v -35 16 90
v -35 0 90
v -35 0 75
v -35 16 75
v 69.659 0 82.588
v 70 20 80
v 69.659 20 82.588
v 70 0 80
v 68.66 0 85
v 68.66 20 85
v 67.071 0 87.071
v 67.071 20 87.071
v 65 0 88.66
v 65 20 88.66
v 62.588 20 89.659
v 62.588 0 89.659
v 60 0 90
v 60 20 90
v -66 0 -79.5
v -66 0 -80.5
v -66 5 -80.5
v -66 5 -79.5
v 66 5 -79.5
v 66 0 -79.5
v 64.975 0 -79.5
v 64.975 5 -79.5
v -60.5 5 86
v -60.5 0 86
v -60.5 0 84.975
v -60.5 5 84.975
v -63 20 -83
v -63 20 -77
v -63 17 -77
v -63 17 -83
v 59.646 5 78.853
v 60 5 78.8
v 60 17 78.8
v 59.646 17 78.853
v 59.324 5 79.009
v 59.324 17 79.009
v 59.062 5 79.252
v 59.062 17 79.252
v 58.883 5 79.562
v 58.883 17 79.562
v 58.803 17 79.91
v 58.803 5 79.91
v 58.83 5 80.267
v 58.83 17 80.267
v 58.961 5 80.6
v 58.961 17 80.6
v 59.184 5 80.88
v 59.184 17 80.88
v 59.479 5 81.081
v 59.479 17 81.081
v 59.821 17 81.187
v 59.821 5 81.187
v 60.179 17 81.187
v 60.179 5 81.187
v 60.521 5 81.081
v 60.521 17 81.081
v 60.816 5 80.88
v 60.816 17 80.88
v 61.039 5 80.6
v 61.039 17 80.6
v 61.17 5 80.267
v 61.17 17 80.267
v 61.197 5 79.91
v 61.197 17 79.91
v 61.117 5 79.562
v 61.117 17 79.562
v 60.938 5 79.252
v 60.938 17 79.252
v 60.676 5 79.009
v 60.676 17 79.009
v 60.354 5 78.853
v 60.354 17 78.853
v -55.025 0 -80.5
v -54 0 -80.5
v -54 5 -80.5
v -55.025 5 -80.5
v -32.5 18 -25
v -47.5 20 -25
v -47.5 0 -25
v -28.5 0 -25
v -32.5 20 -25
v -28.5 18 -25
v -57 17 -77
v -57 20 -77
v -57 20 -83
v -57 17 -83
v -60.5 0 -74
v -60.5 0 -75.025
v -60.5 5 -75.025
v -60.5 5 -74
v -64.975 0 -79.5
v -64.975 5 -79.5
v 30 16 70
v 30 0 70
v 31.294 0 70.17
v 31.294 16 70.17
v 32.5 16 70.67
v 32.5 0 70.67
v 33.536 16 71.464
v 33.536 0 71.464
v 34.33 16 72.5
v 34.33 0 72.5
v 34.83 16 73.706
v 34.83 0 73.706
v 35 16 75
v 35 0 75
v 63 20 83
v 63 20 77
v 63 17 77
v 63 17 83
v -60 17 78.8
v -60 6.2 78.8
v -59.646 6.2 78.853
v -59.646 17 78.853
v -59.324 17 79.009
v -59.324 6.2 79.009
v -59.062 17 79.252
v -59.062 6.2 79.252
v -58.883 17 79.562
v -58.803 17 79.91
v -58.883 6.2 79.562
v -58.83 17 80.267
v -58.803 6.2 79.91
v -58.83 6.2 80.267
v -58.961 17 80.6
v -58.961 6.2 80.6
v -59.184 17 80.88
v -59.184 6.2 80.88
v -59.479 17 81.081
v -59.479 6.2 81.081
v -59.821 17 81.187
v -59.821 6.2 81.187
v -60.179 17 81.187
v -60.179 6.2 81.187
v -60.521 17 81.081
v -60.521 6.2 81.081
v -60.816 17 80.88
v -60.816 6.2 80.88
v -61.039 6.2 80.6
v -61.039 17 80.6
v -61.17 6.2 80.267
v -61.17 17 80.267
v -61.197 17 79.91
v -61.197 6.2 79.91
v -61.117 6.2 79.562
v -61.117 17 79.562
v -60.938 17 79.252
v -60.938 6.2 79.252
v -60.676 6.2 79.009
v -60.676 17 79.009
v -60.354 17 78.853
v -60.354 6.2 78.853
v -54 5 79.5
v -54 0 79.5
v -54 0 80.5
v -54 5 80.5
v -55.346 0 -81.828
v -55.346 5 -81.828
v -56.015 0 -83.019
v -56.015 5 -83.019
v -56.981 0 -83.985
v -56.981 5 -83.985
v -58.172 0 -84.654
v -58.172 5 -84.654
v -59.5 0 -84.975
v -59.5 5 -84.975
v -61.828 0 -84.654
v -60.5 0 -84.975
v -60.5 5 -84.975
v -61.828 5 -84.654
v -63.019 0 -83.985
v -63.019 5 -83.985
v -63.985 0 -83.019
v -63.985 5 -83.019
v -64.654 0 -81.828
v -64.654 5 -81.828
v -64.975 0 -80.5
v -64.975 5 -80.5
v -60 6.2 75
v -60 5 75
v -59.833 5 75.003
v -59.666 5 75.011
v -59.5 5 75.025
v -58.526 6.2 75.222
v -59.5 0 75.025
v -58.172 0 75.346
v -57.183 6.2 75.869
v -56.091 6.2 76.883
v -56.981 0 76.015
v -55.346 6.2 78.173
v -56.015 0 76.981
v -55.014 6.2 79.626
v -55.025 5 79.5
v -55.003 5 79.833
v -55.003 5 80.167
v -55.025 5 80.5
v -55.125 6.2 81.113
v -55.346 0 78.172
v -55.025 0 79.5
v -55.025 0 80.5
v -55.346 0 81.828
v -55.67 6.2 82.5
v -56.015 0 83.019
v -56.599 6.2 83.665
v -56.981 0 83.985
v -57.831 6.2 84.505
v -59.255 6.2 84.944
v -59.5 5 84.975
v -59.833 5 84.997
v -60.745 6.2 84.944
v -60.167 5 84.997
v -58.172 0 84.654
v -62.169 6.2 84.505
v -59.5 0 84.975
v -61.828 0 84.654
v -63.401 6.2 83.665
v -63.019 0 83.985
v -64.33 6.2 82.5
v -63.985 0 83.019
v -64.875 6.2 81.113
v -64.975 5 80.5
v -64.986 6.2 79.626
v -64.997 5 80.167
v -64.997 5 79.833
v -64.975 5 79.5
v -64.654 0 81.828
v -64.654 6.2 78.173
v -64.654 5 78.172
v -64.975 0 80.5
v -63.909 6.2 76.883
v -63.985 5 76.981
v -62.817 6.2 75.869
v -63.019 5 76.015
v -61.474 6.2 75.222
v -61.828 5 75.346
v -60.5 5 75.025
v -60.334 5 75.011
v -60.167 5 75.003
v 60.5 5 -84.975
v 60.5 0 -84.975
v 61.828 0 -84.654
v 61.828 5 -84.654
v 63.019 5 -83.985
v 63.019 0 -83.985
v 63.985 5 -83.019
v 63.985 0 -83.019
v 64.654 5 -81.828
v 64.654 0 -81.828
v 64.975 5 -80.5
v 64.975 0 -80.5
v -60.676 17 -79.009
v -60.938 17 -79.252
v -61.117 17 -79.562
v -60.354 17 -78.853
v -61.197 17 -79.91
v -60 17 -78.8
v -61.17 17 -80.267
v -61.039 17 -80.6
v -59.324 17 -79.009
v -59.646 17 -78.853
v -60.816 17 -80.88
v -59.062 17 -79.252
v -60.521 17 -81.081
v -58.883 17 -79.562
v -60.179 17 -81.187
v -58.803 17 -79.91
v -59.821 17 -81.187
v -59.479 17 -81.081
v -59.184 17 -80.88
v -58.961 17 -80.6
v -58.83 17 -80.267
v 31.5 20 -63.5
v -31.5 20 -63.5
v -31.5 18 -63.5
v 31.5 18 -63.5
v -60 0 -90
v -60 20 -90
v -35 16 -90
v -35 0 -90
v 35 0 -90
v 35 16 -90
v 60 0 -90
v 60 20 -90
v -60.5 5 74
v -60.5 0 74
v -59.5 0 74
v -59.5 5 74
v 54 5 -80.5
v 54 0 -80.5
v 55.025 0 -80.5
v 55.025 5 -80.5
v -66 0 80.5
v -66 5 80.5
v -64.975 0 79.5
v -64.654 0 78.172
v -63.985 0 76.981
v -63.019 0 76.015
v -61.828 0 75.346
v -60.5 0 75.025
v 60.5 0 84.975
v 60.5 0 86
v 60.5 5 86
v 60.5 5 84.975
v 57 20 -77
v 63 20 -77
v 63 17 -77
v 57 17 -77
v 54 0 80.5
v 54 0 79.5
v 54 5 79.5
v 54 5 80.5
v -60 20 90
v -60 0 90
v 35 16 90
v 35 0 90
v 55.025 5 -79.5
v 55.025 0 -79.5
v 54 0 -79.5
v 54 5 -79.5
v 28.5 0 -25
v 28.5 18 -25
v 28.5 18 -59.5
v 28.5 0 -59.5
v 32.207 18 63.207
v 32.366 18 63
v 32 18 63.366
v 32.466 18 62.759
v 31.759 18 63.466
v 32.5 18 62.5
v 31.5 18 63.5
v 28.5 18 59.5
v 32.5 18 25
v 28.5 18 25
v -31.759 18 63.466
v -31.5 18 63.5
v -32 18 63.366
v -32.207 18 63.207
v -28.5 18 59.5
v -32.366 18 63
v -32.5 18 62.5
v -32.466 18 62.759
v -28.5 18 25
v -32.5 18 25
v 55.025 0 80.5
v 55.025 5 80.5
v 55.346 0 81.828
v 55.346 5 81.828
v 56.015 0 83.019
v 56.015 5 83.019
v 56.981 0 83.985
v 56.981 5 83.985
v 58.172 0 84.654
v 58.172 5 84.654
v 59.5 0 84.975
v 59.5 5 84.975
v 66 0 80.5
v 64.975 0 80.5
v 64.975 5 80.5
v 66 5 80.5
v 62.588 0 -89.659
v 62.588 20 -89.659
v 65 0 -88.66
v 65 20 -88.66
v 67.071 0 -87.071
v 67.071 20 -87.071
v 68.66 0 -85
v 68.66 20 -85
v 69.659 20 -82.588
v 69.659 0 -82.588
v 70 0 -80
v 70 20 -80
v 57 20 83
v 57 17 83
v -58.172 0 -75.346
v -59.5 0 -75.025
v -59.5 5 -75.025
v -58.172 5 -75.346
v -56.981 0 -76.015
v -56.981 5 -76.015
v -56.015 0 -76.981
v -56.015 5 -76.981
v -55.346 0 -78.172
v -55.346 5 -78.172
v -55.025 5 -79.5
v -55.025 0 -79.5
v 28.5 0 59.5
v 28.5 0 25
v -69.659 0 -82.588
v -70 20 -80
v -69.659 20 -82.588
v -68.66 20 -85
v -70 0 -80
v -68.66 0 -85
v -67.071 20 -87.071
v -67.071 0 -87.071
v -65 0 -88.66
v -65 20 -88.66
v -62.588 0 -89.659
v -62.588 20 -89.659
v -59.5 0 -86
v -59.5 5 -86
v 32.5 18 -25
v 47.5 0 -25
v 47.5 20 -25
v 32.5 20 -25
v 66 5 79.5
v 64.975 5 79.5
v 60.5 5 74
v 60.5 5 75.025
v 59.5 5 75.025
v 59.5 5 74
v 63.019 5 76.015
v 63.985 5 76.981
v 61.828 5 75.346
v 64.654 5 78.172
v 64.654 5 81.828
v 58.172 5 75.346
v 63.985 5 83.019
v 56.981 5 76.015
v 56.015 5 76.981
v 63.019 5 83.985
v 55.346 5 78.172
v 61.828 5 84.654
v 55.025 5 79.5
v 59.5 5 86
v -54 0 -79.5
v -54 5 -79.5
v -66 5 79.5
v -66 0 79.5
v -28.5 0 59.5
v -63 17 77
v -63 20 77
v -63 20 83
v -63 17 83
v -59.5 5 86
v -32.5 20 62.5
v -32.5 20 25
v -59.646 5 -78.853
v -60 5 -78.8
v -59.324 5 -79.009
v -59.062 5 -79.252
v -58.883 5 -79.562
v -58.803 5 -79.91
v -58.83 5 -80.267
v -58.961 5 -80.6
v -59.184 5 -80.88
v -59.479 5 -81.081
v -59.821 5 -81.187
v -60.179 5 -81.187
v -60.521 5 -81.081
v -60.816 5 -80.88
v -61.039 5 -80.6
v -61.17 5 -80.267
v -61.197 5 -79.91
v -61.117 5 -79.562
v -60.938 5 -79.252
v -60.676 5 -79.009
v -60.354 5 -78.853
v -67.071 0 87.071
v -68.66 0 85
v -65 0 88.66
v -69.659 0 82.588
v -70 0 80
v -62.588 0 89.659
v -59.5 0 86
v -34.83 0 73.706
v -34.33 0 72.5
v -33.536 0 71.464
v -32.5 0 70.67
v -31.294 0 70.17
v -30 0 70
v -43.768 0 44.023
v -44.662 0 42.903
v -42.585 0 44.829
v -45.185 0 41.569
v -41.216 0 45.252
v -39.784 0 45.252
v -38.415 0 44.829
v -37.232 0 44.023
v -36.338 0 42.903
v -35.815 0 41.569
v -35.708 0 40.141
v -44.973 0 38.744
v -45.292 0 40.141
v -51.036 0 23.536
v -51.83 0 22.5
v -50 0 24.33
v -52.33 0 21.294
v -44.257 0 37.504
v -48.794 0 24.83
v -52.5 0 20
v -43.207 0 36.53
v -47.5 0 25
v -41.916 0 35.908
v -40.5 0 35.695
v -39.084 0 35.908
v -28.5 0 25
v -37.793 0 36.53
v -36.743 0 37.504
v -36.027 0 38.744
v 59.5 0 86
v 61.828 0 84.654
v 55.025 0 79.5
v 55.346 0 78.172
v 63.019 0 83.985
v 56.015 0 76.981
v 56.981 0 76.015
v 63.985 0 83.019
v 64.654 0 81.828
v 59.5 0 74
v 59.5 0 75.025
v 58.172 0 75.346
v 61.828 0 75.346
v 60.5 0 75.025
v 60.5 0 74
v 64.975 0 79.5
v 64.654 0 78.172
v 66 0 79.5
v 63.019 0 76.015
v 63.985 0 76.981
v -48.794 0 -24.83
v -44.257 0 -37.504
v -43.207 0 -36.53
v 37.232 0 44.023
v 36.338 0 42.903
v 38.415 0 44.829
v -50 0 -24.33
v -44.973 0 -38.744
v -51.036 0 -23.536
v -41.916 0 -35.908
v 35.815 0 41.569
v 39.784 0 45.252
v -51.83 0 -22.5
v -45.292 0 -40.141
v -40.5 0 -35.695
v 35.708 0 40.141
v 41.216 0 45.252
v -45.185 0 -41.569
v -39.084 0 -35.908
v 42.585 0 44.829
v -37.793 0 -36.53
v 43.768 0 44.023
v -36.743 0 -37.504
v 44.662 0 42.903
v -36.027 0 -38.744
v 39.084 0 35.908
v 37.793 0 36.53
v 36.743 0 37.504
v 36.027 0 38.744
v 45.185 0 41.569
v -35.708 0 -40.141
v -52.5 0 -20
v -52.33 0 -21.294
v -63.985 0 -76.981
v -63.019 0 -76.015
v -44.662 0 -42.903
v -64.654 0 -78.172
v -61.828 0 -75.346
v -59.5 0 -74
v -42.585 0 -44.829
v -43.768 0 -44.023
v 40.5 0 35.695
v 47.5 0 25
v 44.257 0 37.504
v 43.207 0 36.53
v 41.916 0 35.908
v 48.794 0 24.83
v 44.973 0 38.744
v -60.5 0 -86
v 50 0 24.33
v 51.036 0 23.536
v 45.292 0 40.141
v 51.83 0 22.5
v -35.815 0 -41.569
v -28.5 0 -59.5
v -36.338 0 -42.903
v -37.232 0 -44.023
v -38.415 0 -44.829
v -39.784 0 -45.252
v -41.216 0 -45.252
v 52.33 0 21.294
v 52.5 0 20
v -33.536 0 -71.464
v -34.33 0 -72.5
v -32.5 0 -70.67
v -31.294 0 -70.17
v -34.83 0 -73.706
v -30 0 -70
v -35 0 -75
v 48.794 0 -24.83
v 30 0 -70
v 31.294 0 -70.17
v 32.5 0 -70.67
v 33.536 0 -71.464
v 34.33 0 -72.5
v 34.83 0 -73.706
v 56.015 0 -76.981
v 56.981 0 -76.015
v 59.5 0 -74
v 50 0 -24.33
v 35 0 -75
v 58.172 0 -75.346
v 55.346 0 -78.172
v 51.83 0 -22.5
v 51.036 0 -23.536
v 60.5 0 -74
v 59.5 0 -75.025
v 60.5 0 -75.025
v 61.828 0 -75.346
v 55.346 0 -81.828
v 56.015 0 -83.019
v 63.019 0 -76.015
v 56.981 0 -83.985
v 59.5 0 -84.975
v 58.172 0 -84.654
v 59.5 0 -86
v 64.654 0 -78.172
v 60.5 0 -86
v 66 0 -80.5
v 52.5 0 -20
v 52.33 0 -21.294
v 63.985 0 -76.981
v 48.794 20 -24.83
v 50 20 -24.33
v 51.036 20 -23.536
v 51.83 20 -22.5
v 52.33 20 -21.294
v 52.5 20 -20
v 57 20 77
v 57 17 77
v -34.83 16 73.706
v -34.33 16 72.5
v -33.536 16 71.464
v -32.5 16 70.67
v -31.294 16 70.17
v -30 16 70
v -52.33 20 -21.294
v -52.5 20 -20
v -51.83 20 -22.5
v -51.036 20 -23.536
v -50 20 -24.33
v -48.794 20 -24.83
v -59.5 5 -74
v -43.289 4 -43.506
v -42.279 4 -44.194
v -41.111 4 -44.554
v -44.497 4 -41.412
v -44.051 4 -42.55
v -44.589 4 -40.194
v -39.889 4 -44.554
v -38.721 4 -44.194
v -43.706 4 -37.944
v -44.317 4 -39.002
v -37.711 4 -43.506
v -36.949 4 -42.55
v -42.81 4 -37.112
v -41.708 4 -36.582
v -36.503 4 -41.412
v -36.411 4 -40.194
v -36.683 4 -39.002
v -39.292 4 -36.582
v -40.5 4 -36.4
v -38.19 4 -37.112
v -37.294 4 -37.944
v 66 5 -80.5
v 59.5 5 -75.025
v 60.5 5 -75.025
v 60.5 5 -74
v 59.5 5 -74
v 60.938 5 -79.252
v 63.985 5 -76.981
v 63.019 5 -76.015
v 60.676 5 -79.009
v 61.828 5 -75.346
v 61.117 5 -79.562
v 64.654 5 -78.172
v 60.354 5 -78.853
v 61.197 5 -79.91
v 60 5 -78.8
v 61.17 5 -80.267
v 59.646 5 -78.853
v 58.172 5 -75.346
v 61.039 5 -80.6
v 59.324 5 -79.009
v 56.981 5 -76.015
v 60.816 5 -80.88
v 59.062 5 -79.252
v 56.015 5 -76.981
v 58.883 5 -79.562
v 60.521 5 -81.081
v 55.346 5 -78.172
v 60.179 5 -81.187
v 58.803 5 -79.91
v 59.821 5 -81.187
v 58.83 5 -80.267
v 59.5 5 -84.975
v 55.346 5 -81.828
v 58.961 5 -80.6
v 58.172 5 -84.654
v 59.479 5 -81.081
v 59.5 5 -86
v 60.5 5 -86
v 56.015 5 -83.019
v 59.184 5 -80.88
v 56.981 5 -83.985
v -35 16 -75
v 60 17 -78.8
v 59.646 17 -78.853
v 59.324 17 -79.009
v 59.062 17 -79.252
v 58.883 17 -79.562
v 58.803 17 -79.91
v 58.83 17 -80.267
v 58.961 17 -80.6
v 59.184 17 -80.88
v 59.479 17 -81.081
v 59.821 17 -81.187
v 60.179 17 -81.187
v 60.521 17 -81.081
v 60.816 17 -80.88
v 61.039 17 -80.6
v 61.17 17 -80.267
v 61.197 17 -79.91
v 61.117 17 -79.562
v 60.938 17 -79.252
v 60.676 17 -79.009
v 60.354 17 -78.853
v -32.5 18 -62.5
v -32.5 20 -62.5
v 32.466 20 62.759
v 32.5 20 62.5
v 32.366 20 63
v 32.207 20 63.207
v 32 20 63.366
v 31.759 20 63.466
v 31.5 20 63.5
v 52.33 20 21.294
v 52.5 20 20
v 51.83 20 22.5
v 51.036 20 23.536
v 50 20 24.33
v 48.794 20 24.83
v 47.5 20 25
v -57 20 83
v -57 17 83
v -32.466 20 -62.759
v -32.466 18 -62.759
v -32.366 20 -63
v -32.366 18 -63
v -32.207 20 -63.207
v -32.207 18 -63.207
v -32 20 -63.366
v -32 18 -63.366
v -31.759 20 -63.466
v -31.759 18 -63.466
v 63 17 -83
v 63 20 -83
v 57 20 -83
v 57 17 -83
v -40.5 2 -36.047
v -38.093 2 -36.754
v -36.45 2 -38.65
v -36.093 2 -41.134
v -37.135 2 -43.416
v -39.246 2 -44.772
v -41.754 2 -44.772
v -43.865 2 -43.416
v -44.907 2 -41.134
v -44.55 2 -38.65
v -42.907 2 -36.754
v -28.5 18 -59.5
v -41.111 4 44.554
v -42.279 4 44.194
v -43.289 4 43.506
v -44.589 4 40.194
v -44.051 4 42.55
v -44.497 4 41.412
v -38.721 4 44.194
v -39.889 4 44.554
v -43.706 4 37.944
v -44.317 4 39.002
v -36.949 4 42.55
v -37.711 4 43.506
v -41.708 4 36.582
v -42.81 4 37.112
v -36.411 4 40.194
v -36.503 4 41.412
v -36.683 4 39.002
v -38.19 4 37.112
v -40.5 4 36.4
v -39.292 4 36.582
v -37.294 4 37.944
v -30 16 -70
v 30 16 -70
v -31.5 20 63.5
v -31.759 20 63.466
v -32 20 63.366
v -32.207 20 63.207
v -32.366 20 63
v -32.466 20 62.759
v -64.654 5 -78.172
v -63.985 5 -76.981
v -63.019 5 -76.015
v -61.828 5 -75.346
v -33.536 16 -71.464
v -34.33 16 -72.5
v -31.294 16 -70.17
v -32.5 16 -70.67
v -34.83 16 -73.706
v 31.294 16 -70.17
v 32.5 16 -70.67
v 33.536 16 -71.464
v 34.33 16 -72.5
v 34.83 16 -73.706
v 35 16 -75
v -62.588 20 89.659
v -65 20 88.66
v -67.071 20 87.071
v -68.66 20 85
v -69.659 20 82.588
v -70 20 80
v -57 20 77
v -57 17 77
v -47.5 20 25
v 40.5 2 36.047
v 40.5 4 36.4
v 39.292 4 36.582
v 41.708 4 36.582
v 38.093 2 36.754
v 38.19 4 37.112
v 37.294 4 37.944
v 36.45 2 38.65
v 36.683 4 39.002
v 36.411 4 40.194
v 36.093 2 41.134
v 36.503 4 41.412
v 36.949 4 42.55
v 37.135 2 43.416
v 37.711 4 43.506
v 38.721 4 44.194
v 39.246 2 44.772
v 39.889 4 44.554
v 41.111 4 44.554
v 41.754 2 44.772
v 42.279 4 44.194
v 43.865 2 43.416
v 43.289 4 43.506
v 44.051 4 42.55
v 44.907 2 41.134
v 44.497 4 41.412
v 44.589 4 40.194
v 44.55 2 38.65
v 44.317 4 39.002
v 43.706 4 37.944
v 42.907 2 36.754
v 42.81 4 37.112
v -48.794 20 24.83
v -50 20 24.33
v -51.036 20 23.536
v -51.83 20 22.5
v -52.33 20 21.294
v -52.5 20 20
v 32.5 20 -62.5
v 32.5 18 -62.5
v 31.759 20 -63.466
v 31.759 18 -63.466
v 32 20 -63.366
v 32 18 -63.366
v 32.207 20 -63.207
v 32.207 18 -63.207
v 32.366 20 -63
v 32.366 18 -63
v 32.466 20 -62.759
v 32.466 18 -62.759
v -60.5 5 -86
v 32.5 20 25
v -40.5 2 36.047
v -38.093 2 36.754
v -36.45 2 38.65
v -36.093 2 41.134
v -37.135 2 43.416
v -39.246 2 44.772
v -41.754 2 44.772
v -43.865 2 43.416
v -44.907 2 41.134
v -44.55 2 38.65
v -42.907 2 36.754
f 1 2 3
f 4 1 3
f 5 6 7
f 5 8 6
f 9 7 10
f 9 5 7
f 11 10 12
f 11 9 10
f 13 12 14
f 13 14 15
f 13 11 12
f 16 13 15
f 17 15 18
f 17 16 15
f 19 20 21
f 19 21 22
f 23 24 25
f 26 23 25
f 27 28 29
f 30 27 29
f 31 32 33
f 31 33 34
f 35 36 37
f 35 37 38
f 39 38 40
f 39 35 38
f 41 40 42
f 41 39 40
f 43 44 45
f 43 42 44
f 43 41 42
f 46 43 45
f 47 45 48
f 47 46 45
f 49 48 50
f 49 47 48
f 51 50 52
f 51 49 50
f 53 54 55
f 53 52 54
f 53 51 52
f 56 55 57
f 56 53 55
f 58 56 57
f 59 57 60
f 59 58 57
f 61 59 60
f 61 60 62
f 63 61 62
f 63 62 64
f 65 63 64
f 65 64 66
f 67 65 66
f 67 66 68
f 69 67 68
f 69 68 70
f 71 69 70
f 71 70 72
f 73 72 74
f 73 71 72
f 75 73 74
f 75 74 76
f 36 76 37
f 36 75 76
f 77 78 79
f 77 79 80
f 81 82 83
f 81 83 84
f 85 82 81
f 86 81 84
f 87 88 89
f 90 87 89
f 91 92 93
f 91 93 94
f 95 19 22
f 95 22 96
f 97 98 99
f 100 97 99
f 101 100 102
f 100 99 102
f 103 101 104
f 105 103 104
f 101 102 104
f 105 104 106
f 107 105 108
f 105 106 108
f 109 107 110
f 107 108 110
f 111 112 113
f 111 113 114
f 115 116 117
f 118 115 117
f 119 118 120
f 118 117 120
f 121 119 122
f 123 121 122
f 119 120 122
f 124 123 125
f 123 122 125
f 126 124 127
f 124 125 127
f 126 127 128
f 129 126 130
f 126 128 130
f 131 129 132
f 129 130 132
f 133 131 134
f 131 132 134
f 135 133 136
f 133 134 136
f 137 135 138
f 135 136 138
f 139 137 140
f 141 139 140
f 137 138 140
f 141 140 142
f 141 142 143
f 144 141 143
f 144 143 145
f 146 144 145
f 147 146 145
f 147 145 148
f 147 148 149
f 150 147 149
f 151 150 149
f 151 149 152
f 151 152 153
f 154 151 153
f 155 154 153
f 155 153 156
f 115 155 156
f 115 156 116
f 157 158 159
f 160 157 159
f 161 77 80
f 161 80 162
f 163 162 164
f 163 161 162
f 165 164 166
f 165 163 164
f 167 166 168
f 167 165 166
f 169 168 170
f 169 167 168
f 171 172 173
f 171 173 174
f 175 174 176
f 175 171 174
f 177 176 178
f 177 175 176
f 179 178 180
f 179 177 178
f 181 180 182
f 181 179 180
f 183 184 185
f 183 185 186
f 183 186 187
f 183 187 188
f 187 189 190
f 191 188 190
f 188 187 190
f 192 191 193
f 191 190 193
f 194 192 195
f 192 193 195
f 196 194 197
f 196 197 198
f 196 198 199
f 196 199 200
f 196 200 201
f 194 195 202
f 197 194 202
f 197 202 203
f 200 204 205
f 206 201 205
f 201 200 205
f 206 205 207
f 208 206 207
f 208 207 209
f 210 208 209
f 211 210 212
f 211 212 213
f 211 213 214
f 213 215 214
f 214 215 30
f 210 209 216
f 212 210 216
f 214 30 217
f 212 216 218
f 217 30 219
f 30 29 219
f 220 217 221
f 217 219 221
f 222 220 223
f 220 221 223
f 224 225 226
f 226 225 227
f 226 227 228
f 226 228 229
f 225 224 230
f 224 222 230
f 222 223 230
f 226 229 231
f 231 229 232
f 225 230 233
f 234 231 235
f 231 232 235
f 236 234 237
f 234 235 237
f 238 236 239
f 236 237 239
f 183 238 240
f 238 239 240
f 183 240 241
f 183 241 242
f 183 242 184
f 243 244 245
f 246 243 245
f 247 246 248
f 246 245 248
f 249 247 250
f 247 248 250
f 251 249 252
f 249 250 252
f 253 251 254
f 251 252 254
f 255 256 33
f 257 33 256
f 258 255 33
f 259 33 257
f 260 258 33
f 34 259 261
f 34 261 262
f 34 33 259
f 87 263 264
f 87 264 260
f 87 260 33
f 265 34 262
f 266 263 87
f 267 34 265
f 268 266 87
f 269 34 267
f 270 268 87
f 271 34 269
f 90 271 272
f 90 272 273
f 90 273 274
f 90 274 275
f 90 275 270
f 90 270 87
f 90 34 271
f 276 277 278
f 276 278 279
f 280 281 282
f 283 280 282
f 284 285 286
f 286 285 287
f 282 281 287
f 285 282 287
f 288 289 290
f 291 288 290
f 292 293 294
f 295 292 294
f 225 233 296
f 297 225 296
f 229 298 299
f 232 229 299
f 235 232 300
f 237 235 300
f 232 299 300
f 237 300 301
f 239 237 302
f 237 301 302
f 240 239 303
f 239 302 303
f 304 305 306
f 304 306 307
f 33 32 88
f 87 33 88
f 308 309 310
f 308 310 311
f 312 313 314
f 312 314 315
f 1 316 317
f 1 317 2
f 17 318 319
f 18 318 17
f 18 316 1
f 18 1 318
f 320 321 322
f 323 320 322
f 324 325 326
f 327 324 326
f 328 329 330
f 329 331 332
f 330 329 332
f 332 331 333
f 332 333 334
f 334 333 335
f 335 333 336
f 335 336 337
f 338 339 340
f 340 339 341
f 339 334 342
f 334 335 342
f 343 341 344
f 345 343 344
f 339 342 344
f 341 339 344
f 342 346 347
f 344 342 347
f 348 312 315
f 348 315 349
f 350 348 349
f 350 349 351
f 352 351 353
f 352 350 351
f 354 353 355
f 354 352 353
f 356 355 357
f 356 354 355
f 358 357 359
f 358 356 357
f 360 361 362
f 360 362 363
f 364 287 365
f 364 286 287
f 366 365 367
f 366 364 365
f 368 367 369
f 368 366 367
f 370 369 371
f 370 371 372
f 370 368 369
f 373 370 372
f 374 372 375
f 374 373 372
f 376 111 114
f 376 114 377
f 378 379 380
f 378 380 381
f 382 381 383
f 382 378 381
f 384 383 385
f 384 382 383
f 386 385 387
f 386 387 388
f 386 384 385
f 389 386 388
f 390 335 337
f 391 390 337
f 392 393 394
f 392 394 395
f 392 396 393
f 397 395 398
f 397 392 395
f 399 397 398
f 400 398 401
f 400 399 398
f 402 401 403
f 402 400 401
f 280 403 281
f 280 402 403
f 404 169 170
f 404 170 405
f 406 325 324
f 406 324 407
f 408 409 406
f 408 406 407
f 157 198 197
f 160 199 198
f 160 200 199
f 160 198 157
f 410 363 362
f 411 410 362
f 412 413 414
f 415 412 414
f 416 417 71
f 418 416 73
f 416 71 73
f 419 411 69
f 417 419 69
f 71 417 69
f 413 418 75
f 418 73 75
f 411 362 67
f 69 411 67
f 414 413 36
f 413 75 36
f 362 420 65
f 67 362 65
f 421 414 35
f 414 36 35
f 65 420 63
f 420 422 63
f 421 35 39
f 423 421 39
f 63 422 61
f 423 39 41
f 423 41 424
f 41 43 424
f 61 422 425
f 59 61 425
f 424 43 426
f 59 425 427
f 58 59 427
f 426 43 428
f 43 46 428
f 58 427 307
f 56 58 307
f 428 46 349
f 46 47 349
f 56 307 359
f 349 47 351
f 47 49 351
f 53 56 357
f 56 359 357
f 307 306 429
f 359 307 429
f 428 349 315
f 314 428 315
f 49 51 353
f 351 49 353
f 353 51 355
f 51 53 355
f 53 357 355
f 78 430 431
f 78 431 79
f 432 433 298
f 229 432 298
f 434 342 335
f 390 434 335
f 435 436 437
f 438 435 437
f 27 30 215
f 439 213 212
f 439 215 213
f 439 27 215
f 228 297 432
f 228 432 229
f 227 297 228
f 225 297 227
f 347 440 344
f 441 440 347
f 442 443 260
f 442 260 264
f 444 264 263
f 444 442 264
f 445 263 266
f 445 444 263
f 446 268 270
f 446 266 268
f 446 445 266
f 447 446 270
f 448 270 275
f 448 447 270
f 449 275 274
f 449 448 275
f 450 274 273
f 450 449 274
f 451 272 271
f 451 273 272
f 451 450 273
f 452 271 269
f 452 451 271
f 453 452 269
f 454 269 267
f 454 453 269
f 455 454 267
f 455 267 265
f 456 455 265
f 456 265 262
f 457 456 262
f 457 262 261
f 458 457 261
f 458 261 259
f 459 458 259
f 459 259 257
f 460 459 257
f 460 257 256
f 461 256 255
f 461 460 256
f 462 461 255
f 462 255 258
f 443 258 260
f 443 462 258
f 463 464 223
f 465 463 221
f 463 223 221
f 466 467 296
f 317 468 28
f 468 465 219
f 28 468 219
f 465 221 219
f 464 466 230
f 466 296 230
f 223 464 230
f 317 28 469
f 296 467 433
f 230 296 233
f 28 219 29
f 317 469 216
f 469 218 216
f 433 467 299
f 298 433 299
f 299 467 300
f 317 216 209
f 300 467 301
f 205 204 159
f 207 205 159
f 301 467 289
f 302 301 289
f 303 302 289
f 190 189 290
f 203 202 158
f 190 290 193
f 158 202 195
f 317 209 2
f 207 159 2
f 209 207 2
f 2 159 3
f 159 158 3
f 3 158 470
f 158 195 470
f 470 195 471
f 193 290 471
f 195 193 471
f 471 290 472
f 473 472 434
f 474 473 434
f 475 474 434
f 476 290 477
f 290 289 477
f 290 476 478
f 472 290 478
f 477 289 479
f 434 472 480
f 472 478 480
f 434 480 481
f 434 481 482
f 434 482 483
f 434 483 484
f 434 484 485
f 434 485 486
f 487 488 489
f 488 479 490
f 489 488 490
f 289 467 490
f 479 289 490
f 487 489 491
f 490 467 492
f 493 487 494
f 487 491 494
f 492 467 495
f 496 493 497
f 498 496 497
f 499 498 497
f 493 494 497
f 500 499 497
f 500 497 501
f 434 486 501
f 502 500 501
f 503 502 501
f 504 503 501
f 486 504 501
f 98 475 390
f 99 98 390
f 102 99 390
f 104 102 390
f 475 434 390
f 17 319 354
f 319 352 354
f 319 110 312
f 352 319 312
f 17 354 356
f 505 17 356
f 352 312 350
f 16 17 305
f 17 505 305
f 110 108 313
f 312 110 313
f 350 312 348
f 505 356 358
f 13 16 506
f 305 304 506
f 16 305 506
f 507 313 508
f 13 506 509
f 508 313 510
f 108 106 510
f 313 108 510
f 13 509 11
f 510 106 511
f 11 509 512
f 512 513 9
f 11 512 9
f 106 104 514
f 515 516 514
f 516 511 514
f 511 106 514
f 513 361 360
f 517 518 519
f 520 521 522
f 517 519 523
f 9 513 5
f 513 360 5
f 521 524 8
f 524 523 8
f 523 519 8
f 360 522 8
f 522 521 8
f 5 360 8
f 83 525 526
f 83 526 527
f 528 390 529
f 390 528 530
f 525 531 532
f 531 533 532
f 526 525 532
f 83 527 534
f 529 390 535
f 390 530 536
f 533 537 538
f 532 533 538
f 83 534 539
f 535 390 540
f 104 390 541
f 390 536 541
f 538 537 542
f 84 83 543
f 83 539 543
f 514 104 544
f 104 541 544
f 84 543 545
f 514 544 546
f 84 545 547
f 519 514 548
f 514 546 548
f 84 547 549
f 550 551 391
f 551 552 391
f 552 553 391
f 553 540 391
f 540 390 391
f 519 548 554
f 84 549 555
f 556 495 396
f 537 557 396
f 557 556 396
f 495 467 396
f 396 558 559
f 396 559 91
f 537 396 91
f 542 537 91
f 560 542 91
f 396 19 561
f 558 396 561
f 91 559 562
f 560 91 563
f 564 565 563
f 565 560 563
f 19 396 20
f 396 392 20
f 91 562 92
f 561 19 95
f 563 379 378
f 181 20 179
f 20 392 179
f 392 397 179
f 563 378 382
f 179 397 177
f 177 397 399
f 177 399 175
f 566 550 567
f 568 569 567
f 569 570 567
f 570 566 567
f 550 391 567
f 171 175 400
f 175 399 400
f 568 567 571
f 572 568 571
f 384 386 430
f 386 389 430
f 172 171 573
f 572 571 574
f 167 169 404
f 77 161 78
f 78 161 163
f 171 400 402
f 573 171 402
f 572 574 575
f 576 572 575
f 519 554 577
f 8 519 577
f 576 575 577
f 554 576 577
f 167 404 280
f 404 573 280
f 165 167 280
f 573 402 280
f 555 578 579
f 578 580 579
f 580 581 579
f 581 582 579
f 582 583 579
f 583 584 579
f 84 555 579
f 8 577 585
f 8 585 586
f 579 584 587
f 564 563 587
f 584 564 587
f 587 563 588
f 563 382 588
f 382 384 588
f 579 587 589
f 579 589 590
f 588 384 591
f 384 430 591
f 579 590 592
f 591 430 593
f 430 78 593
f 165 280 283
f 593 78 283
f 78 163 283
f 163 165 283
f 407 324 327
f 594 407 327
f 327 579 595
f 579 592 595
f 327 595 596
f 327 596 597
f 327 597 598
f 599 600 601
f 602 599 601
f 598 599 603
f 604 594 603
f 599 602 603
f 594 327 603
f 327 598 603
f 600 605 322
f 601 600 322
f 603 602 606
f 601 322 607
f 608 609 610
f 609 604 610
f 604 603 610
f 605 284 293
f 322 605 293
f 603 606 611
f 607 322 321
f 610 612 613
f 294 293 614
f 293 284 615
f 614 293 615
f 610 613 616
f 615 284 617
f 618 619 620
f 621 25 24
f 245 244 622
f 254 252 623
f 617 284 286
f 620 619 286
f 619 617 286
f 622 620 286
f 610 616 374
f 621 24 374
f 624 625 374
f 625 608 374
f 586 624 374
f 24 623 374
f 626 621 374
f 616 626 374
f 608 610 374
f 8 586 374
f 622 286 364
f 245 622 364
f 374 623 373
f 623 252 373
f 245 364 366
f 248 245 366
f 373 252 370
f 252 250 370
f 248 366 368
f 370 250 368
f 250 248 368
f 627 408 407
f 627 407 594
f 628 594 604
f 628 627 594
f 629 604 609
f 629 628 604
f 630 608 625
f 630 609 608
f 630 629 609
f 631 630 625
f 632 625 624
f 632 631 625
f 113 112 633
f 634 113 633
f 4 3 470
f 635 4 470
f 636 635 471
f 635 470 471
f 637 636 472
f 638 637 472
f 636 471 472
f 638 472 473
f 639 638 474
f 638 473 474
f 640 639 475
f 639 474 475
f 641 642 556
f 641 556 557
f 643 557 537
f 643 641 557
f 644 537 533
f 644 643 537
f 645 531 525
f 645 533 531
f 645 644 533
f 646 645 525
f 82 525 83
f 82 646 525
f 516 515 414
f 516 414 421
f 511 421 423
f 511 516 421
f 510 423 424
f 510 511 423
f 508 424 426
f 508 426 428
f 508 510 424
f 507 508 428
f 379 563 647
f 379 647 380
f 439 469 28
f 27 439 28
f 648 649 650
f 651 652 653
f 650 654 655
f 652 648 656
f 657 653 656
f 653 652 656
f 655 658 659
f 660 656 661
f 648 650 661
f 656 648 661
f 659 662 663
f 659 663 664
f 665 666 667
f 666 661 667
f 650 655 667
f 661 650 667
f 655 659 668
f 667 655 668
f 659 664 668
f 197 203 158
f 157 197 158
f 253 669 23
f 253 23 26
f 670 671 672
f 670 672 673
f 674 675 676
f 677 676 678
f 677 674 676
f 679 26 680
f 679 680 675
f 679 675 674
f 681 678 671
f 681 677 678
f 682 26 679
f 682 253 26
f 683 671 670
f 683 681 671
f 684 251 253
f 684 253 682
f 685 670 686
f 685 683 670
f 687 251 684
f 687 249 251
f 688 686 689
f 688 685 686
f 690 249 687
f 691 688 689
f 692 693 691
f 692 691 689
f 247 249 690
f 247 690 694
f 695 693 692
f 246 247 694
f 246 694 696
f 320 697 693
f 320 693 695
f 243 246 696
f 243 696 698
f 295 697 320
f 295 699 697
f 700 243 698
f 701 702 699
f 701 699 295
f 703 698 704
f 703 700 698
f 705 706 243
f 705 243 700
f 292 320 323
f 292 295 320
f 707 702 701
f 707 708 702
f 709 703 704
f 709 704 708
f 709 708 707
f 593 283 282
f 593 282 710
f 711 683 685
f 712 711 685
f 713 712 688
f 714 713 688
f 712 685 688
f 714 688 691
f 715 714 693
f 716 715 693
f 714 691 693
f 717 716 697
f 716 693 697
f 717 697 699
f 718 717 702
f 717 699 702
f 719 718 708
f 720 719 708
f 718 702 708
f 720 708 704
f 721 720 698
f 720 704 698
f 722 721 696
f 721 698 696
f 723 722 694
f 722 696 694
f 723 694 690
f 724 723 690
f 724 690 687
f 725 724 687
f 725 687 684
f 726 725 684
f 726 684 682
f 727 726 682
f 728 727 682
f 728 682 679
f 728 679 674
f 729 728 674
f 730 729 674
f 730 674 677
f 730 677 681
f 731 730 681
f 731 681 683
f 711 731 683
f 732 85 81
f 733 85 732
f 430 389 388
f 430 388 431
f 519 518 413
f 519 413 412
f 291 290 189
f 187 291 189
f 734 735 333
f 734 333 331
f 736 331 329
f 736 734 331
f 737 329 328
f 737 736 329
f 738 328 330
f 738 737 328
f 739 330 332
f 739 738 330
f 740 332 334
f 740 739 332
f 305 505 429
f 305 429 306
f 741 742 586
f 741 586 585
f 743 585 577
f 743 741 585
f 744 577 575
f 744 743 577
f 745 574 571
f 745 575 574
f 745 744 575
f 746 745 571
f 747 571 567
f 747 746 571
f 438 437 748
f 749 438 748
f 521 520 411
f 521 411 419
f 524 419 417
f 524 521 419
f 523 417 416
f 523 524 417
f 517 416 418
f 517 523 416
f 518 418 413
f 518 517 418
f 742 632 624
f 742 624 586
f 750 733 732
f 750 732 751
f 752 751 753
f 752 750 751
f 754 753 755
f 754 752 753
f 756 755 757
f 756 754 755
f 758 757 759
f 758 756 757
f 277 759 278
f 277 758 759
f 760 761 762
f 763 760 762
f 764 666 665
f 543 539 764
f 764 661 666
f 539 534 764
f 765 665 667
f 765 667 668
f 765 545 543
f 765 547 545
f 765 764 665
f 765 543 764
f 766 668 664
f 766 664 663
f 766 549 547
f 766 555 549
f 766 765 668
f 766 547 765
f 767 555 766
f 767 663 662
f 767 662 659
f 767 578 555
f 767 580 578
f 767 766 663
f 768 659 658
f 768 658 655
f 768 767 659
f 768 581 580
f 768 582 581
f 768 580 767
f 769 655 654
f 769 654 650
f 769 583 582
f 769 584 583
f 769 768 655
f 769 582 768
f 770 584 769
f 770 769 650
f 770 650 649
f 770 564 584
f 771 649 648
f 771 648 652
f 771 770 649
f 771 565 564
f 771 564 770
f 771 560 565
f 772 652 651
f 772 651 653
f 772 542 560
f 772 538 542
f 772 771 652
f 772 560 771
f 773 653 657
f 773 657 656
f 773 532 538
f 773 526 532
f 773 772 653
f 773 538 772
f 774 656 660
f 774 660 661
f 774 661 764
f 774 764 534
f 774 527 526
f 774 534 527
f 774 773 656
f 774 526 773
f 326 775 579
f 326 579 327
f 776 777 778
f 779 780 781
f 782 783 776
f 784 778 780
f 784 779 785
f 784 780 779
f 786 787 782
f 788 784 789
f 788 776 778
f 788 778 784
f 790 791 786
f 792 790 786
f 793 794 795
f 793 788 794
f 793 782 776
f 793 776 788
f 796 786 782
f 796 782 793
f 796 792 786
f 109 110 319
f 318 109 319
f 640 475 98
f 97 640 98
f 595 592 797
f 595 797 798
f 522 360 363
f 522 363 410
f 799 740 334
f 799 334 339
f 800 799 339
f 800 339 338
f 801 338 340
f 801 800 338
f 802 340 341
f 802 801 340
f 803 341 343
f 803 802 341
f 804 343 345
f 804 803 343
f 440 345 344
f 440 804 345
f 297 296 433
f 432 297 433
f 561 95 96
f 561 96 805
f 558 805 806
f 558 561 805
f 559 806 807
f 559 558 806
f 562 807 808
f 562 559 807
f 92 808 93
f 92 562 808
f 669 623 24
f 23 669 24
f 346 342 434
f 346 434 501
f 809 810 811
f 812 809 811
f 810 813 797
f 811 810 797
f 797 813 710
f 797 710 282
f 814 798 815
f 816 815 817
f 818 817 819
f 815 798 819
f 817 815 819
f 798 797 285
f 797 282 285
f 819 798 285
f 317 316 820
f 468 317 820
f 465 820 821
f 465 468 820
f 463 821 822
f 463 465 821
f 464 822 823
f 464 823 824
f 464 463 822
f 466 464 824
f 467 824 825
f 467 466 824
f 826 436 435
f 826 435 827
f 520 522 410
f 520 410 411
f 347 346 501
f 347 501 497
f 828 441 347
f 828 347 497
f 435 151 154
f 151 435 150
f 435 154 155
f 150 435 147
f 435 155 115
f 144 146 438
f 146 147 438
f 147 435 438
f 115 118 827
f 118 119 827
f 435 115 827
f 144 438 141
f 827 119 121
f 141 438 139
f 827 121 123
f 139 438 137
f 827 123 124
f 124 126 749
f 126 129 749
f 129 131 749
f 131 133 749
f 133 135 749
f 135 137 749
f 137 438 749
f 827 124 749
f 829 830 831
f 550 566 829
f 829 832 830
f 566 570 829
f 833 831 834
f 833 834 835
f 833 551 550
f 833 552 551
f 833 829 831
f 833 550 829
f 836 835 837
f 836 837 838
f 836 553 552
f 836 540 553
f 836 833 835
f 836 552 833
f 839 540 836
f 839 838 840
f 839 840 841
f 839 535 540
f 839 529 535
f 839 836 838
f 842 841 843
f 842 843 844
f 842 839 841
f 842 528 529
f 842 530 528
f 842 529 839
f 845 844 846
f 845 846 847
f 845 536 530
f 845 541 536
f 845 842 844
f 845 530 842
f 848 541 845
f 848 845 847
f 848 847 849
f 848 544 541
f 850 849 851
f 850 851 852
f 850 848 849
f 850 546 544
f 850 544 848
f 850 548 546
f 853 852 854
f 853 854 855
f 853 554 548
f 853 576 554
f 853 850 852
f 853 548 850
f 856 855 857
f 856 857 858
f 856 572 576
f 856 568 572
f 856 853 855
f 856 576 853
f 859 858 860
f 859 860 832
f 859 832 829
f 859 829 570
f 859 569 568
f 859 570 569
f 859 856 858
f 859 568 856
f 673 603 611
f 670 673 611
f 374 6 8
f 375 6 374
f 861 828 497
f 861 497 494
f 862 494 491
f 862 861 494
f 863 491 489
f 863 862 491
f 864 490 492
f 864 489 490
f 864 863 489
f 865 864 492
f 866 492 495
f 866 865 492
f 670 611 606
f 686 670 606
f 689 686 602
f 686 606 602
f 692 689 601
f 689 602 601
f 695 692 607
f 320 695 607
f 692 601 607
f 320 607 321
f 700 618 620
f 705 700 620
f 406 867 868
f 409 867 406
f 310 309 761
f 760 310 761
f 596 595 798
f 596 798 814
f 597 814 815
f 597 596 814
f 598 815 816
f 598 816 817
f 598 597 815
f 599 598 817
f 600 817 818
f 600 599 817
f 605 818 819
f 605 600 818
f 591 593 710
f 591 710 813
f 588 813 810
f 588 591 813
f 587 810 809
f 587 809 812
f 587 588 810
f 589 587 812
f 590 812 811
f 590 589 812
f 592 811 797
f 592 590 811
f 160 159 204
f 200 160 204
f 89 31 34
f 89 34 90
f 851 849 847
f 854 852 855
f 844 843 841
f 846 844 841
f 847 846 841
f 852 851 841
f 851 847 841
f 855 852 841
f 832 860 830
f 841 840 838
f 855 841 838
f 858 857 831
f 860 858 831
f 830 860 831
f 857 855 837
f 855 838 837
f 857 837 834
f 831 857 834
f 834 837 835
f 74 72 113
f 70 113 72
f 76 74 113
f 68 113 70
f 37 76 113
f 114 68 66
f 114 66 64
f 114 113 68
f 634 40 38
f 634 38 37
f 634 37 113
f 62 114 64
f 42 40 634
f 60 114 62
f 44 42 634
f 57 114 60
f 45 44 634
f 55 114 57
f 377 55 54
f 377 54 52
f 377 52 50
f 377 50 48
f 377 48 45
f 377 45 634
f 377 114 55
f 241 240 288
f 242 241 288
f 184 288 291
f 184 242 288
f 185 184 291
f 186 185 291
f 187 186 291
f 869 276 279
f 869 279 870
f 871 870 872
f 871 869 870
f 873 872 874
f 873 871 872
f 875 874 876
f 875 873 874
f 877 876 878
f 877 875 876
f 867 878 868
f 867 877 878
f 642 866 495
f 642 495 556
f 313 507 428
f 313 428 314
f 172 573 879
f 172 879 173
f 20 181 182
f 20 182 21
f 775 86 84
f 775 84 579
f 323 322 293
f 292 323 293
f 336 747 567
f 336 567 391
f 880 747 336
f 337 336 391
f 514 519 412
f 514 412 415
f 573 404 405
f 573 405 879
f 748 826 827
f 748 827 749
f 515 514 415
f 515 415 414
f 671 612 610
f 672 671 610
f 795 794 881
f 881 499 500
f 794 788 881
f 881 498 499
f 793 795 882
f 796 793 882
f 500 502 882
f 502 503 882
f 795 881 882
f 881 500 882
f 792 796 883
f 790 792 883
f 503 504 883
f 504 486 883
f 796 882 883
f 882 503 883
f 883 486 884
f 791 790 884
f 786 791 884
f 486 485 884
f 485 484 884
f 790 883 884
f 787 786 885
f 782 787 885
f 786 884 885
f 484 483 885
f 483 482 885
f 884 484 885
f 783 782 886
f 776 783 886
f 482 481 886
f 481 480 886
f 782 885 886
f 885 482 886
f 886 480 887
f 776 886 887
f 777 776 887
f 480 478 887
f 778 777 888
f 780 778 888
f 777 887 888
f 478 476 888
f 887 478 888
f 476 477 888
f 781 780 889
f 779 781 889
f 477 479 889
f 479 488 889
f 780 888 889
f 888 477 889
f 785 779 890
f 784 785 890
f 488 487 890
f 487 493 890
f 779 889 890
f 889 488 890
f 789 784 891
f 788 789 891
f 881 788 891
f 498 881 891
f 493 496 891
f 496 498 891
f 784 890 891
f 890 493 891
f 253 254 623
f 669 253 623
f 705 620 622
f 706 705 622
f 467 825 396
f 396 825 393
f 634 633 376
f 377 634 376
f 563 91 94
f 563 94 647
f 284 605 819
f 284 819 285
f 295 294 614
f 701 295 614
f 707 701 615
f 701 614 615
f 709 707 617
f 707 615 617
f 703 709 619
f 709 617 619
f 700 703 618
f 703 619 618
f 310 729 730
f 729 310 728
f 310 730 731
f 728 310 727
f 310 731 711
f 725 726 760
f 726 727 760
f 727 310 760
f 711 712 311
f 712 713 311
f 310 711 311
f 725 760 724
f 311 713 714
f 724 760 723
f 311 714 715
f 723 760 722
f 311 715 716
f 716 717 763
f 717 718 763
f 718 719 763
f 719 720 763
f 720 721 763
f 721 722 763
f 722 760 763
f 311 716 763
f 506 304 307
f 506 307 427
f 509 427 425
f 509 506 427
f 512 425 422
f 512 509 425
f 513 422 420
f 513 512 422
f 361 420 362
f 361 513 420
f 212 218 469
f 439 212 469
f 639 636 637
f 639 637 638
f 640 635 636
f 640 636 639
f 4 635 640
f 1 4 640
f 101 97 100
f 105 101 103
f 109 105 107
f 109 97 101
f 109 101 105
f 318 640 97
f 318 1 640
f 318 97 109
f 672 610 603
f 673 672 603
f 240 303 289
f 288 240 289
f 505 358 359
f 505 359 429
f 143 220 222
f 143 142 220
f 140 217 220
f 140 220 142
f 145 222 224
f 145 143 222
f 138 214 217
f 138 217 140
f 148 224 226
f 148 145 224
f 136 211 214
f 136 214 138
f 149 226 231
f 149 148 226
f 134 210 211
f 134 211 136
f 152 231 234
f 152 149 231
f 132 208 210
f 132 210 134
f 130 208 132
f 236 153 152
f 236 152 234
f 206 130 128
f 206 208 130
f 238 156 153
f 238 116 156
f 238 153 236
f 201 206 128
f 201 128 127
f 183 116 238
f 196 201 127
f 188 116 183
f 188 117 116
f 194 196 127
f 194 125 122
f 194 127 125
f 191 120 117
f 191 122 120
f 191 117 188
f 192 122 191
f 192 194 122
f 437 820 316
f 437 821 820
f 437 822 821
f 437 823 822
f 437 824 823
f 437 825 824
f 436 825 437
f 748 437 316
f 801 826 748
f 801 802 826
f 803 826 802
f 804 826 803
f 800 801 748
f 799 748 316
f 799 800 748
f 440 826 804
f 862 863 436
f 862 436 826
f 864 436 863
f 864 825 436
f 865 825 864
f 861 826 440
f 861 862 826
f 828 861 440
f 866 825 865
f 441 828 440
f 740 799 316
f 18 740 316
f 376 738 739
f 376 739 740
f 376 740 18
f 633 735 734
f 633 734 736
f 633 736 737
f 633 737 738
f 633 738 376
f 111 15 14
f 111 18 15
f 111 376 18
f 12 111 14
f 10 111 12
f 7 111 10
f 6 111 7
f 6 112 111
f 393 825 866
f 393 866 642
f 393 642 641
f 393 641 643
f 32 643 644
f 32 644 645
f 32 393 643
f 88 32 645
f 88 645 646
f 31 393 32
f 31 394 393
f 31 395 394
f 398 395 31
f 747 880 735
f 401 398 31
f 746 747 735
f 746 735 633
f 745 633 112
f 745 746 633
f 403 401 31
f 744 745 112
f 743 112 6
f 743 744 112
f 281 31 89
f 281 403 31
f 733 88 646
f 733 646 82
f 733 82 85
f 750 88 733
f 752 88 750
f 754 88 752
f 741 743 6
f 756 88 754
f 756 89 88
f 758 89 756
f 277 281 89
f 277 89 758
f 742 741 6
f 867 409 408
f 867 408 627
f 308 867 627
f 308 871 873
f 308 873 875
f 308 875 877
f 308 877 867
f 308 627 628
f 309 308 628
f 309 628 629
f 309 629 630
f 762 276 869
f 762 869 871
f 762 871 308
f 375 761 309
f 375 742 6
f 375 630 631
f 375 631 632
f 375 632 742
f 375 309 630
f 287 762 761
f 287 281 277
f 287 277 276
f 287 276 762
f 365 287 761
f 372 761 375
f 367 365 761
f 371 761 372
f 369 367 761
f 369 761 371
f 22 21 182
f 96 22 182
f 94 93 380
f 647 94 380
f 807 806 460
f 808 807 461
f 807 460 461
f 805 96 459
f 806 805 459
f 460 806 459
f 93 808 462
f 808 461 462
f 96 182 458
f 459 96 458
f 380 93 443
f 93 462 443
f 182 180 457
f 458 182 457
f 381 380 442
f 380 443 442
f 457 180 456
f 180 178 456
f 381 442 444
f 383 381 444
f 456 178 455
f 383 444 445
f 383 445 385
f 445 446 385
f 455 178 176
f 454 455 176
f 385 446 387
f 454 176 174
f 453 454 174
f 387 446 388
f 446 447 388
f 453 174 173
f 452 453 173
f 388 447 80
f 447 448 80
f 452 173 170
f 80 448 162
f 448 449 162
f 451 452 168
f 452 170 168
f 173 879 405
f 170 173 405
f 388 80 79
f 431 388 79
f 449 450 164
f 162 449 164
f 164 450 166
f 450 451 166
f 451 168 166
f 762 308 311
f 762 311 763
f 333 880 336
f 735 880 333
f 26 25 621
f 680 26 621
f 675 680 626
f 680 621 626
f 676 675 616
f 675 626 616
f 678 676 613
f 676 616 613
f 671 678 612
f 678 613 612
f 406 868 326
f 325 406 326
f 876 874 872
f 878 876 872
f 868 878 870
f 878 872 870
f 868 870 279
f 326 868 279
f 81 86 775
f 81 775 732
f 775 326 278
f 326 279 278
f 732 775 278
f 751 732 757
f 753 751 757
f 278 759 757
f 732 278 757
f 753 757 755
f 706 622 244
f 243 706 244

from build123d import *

# Parameters (mm, degrees)
SKETCH_1_W                                 = 200
SKETCH_1_H                                 = 200
EXTRUDE_1_DEPTH                            = 20
SKETCH_2_W                                 = 200
SKETCH_2_H                                 = 200
SKETCH_2_W_2                               = 140
SKETCH_2_H_2                               = 180
CUT_EXTRUDE_2_DEPTH                        = 143.828568571
FILLET_1_R                                 = 10
FILLET_2_R                                 = 10
FILLET_3_R                                 = 10
FILLET_4_R                                 = 10
CUT_EXTRUDE_4_DEPTH                        = 5
MIRROR_3_AT_THE_SECOND_PLANE_COPY_1_DEPTH  = 5
SKETCH_5_R                                 = 5
CUT_EXTRUDE_5_DEPTH                        = 6.2
CUT_EXTRUDE_7_DEPTH                        = 16
SKETCH_8_R                                 = 4.1
CUT_EXTRUDE_8_DEPTH                        = 4
DRAFT_2_ANGLE                              = 10
DRAFT_2_OF_MIRROR_10_2_ANGLE               = 10
DRAFT_2_OF_MIRROR_11_2_ANGLE               = 10
SKETCH_14_W                                = 6
SKETCH_14_H                                = 6
CUT_EXTRUDE_9_DEPTH                        = 3
MIRROR_12_AT_THE_SECOND_PLANE_COPY_1_SKE_W = 6
MIRROR_12_AT_THE_SECOND_PLANE_COPY_1_SKE_H = 6
MIRROR_12_AT_THE_SECOND_PLANE_COPY_1_DEPTH = 3
CUT_EXTRUDE_14_DEPTH                       = 2
SKETCH_22_W                                = 57
SKETCH_22_H                                = 119
CUT_EXTRUDE_15_DEPTH                       = 116.429632244
CUT_EXTRUDE_16_DEPTH                       = 116.758369028
SKETCH_24_R                                = 1.2
CUT_EXTRUDE_17_DEPTH                       = 116.758369028
MIRROR_13_AT_THE_SECOND_PLANE_COPY_1_SKE_R = 1.2
MIRROR_13_AT_THE_SECOND_PLANE_COPY_1_DEPTH = 116.758369028


with BuildPart() as part:
    # 草图1 → 凸台-拉伸1 (new body)
    with BuildSketch(Plane(origin=(0, 0, 0), x_dir=(1, 0, 0), z_dir=(0, 1, 0))):
        Rectangle(SKETCH_1_W, SKETCH_1_H)
    extrude(amount=EXTRUDE_1_DEPTH)

    # 草图2 → 切除-拉伸2 (cut, through all)
    with BuildSketch(Plane(origin=(0, 20, 0), x_dir=(1, 0, 0), z_dir=(0, 1, 0))):
        Rectangle(SKETCH_2_W, SKETCH_2_H)
        Rectangle(SKETCH_2_W_2, SKETCH_2_H_2, mode=Mode.SUBTRACT)
    extrude(amount=-CUT_EXTRUDE_2_DEPTH, mode=Mode.SUBTRACT)

    # 圆角1
    fillet_1_edges = [part.edges().sort_by_distance(p)[0] for p in [
        (-70, 10, -90),
    ]]
    fillet(fillet_1_edges, radius=FILLET_1_R)

    # 圆角2
    fillet_2_edges = [part.edges().sort_by_distance(p)[0] for p in [
        (70, 10, -90),
    ]]
    fillet(fillet_2_edges, radius=FILLET_2_R)

    # 圆角3
    fillet_3_edges = [part.edges().sort_by_distance(p)[0] for p in [
        (70, 10, 90),
    ]]
    fillet(fillet_3_edges, radius=FILLET_3_R)

    # 圆角4
    fillet_4_edges = [part.edges().sort_by_distance(p)[0] for p in [
        (-70, 10, 90),
    ]]
    fillet(fillet_4_edges, radius=FILLET_4_R)

    # 草图4 → 切除-拉伸4 (cut)
    with BuildSketch(Plane.XZ):
        with BuildLine():
            Line((-59.5, 84.974937186), (-59.5, 86))
            Line((-59.5, 86), (-60.5, 86))
            Line((-60.5, 86), (-60.5, 84.974937186))
            ThreePointArc((-60.5, 84.974937186), (-63.535533906, 83.535533906), (-64.974937186, 80.5))
            Line((-64.974937186, 80.5), (-66, 80.5))
            Line((-66, 80.5), (-66, 79.5))
            Line((-66, 79.5), (-64.974937186, 79.5))
            ThreePointArc((-64.974937186, 79.5), (-63.535533906, 76.464466094), (-60.5, 75.025062814))
            Line((-60.5, 75.025062814), (-60.5, 74))
            Line((-60.5, 74), (-59.5, 74))
            Line((-59.5, 74), (-59.5, 75.025062814))
            ThreePointArc((-59.5, 75.025062814), (-56.464466094, 76.464466094), (-55.025062814, 79.5))
            Line((-55.025062814, 79.5), (-54, 79.5))
            Line((-54, 79.5), (-54, 80.5))
            Line((-54, 80.5), (-55.025062814, 80.5))
            ThreePointArc((-55.025062814, 80.5), (-56.464466094, 83.535533906), (-59.5, 84.974937186))
        make_face()
    cut_extrude_4 = extrude(amount=-CUT_EXTRUDE_4_DEPTH, mode=Mode.SUBTRACT)

    # 镜向3: 切除-拉伸4 across plane
    add(cut_extrude_4.mirror(Plane(origin=(0, 0, 0), x_dir=(0, 0, 1), z_dir=(1, 0, 0))), mode=Mode.SUBTRACT)

    # 镜向3 at the second plane: 切除-拉伸4 across plane
    add(cut_extrude_4.mirror(Plane.XY), mode=Mode.SUBTRACT)

    # 镜向3 at the second plane copy 1 sket → 镜向3 at the second plane copy 1 (cut)
    with BuildSketch(Plane(origin=(0, 0, 0), x_dir=(-1, 0, 0), z_dir=(0, -1, 0))):
        with BuildLine():
            Line((-59.5, 84.974937186), (-59.5, 86))
            Line((-59.5, 86), (-60.5, 86))
            Line((-60.5, 86), (-60.5, 84.974937186))
            ThreePointArc((-60.5, 84.974937186), (-63.535533906, 83.535533906), (-64.974937186, 80.5))
            Line((-64.974937186, 80.5), (-66, 80.5))
            Line((-66, 80.5), (-66, 79.5))
            Line((-66, 79.5), (-64.974937186, 79.5))
            ThreePointArc((-64.974937186, 79.5), (-63.535533906, 76.464466094), (-60.5, 75.025062814))
            Line((-60.5, 75.025062814), (-60.5, 74))
            Line((-60.5, 74), (-59.5, 74))
            Line((-59.5, 74), (-59.5, 75.025062814))
            ThreePointArc((-59.5, 75.025062814), (-56.464466094, 76.464466094), (-55.025062814, 79.5))
            Line((-55.025062814, 79.5), (-54, 79.5))
            Line((-54, 79.5), (-54, 80.5))
            Line((-54, 80.5), (-55.025062814, 80.5))
            ThreePointArc((-55.025062814, 80.5), (-56.464466094, 83.535533906), (-59.5, 84.974937186))
        make_face()
    extrude(amount=-MIRROR_3_AT_THE_SECOND_PLANE_COPY_1_DEPTH, mode=Mode.SUBTRACT)

    # 草图5 → 切除-拉伸5 (cut)
    with BuildSketch(Plane.XZ):
        with Locations(Location((-60, 80, 0), (0, 0, 270))):
            Circle(SKETCH_5_R)
    extrude(amount=-CUT_EXTRUDE_5_DEPTH, mode=Mode.SUBTRACT)

    # 草图7 → 切除-拉伸7 (cut)
    with BuildSketch(Plane.XZ):
        with BuildLine():
            Line((35, 110), (-35, 110))
            Line((-35, 110), (-35, 75))
            ThreePointArc((-35, 75), (-33.535533906, 71.464466094), (-30, 70))
            Line((-30, 70), (30, 70))
            ThreePointArc((30, 70), (33.535533906, 71.464466094), (35, 75))
            Line((35, 75), (35, 110))
        make_face()
    cut_extrude_7 = extrude(amount=-CUT_EXTRUDE_7_DEPTH, mode=Mode.SUBTRACT)

    # 镜向6: 切除-拉伸7 across plane
    add(cut_extrude_7.mirror(Plane.XY), mode=Mode.SUBTRACT)

    # 草图8 → 切除-拉伸8 (cut)
    with BuildSketch(Plane.XZ):
        with Locations(Location((-40.5, 40.5, 0), (0, 0, 270))):
            Circle(SKETCH_8_R)
    cut_extrude_8 = extrude(amount=-CUT_EXTRUDE_8_DEPTH, mode=Mode.SUBTRACT)

    # 拔模2
    draft_2_faces = [part.faces().sort_by_distance(p)[0] for p in [
        (-40.5, 2, 44.6),
    ]]
    draft(draft_2_faces, Plane(origin=(-40.5, 4, 40.5), x_dir=(0, 0, -1), z_dir=(0, -1, 0)), DRAFT_2_ANGLE)

    # 镜向10: 切除-拉伸8 across plane
    add(cut_extrude_8.mirror(Plane(origin=(0, 0, 0), x_dir=(0, 0, 1), z_dir=(1, 0, 0))), mode=Mode.SUBTRACT)

    # 拔模2 of Mirror 10 2
    draft_2_of_mirror_10_2_faces = [part.faces().sort_by_distance(p)[0] for p in [
        (40.5, 2, 44.6),
    ]]
    draft(draft_2_of_mirror_10_2_faces, Plane(origin=(40.5, 4, 40.5), x_dir=(0, 0, -1), z_dir=(0, -1, 0)), DRAFT_2_OF_MIRROR_10_2_ANGLE)

    # 镜向11: 切除-拉伸8 across plane
    add(cut_extrude_8.mirror(Plane.XY), mode=Mode.SUBTRACT)

    # 拔模2 of Mirror 11 2
    draft_2_of_mirror_11_2_faces = [part.faces().sort_by_distance(p)[0] for p in [
        (-40.5, 2, -44.6),
    ]]
    draft(draft_2_of_mirror_11_2_faces, Plane(origin=(-40.5, 4, -40.5), x_dir=(0, 0, 1), z_dir=(0, -1, 0)), DRAFT_2_OF_MIRROR_11_2_ANGLE)

    # 草图14 → 切除-拉伸9 (cut)
    with BuildSketch(Plane(origin=(0, 20, 0), x_dir=(1, 0, 0), z_dir=(0, 1, 0))):
        with Locations((-60, 80)):
            Rectangle(SKETCH_14_W, SKETCH_14_H)
    cut_extrude_9 = extrude(amount=-CUT_EXTRUDE_9_DEPTH, mode=Mode.SUBTRACT)

    # 镜向12: 切除-拉伸9 across plane
    add(cut_extrude_9.mirror(Plane(origin=(0, 0, 0), x_dir=(0, 0, 1), z_dir=(1, 0, 0))), mode=Mode.SUBTRACT)

    # 镜向12 at the second plane: 切除-拉伸9 across plane
    add(cut_extrude_9.mirror(Plane.XY), mode=Mode.SUBTRACT)

    # 镜向12 at the second plane copy 1 ske → 镜向12 at the second plane copy 1 (cut)
    with BuildSketch(Plane(origin=(0, 20, 0), x_dir=(-1, 0, 0), z_dir=(0, 1, 0))):
        with Locations((-60, 80)):
            Rectangle(MIRROR_12_AT_THE_SECOND_PLANE_COPY_1_SKE_W, MIRROR_12_AT_THE_SECOND_PLANE_COPY_1_SKE_H)
    extrude(amount=-MIRROR_12_AT_THE_SECOND_PLANE_COPY_1_DEPTH, mode=Mode.SUBTRACT)

    # 草图21 → 切除-拉伸14 (cut)
    with BuildSketch(Plane(origin=(0, 20, 0), x_dir=(1, 0, 0), z_dir=(0, 1, 0))):
        with BuildLine():
            Line((31.5, -63.5), (-31.5, -63.5))
            ThreePointArc((-31.5, -63.5), (-32.207106781, -63.207106781), (-32.5, -62.5))
            Line((-32.5, -62.5), (-32.5, 62.5))
            ThreePointArc((-32.5, 62.5), (-32.207106781, 63.207106781), (-31.5, 63.5))
            Line((-31.5, 63.5), (31.5, 63.5))
            ThreePointArc((31.5, 63.5), (32.207106781, 63.207106781), (32.5, 62.5))
            Line((32.5, 62.5), (32.5, -62.5))
            ThreePointArc((32.5, -62.5), (32.207106781, -63.207106781), (31.5, -63.5))
        make_face()
    extrude(amount=-CUT_EXTRUDE_14_DEPTH, mode=Mode.SUBTRACT)

    # 草图22 → 切除-拉伸15 (cut, through all)
    with BuildSketch(Plane(origin=(0, 18, 0), x_dir=(1, 0, 0), z_dir=(0, 1, 0))):
        Rectangle(SKETCH_22_W, SKETCH_22_H)
    extrude(amount=-CUT_EXTRUDE_15_DEPTH, mode=Mode.SUBTRACT)

    # 草图23 → 切除-拉伸16 (cut, through all)
    with BuildSketch(Plane(origin=(0, 20, 0), x_dir=(1, 0, 0), z_dir=(0, 1, 0))):
        with BuildLine():
            Line((47.5, -25), (-47.5, -25))
            ThreePointArc((-47.5, -25), (-51.035533906, -23.535533906), (-52.5, -20))
            Line((-52.5, -20), (-52.5, 20))
            ThreePointArc((-52.5, 20), (-51.035533906, 23.535533906), (-47.5, 25))
            Line((-47.5, 25), (47.5, 25))
            ThreePointArc((47.5, 25), (51.035533906, 23.535533906), (52.5, 20))
            Line((52.5, 20), (52.5, -20))
            ThreePointArc((52.5, -20), (51.035533906, -23.535533906), (47.5, -25))
        make_face()
    extrude(amount=-CUT_EXTRUDE_16_DEPTH, mode=Mode.SUBTRACT)

    # 草图24 → 切除-拉伸17 (cut, through all)
    with BuildSketch(Plane.XZ):
        with Locations(Location((-60, 80, 0), (0, 0, 270))):
            Circle(SKETCH_24_R)
    cut_extrude_17 = extrude(amount=-CUT_EXTRUDE_17_DEPTH, mode=Mode.SUBTRACT)

    # 镜向13: 切除-拉伸17 across plane
    add(cut_extrude_17.mirror(Plane.XY), mode=Mode.SUBTRACT)

    # 镜向13 at the second plane: 切除-拉伸17 across plane
    add(cut_extrude_17.mirror(Plane(origin=(0, 0, 0), x_dir=(0, 0, 1), z_dir=(1, 0, 0))), mode=Mode.SUBTRACT)

    # 镜向13 at the second plane copy 1 ske → 镜向13 at the second plane copy 1 (cut, through all)
    with BuildSketch(Plane(origin=(0, 0, 0), x_dir=(-1, 0, 0), z_dir=(0, -1, 0))):
        with Locations(Location((-60, 80, 0), (0, 0, 270))):
            Circle(MIRROR_13_AT_THE_SECOND_PLANE_COPY_1_SKE_R)
    extrude(amount=-MIRROR_13_AT_THE_SECOND_PLANE_COPY_1_DEPTH, mode=Mode.SUBTRACT)


solid = part.part
